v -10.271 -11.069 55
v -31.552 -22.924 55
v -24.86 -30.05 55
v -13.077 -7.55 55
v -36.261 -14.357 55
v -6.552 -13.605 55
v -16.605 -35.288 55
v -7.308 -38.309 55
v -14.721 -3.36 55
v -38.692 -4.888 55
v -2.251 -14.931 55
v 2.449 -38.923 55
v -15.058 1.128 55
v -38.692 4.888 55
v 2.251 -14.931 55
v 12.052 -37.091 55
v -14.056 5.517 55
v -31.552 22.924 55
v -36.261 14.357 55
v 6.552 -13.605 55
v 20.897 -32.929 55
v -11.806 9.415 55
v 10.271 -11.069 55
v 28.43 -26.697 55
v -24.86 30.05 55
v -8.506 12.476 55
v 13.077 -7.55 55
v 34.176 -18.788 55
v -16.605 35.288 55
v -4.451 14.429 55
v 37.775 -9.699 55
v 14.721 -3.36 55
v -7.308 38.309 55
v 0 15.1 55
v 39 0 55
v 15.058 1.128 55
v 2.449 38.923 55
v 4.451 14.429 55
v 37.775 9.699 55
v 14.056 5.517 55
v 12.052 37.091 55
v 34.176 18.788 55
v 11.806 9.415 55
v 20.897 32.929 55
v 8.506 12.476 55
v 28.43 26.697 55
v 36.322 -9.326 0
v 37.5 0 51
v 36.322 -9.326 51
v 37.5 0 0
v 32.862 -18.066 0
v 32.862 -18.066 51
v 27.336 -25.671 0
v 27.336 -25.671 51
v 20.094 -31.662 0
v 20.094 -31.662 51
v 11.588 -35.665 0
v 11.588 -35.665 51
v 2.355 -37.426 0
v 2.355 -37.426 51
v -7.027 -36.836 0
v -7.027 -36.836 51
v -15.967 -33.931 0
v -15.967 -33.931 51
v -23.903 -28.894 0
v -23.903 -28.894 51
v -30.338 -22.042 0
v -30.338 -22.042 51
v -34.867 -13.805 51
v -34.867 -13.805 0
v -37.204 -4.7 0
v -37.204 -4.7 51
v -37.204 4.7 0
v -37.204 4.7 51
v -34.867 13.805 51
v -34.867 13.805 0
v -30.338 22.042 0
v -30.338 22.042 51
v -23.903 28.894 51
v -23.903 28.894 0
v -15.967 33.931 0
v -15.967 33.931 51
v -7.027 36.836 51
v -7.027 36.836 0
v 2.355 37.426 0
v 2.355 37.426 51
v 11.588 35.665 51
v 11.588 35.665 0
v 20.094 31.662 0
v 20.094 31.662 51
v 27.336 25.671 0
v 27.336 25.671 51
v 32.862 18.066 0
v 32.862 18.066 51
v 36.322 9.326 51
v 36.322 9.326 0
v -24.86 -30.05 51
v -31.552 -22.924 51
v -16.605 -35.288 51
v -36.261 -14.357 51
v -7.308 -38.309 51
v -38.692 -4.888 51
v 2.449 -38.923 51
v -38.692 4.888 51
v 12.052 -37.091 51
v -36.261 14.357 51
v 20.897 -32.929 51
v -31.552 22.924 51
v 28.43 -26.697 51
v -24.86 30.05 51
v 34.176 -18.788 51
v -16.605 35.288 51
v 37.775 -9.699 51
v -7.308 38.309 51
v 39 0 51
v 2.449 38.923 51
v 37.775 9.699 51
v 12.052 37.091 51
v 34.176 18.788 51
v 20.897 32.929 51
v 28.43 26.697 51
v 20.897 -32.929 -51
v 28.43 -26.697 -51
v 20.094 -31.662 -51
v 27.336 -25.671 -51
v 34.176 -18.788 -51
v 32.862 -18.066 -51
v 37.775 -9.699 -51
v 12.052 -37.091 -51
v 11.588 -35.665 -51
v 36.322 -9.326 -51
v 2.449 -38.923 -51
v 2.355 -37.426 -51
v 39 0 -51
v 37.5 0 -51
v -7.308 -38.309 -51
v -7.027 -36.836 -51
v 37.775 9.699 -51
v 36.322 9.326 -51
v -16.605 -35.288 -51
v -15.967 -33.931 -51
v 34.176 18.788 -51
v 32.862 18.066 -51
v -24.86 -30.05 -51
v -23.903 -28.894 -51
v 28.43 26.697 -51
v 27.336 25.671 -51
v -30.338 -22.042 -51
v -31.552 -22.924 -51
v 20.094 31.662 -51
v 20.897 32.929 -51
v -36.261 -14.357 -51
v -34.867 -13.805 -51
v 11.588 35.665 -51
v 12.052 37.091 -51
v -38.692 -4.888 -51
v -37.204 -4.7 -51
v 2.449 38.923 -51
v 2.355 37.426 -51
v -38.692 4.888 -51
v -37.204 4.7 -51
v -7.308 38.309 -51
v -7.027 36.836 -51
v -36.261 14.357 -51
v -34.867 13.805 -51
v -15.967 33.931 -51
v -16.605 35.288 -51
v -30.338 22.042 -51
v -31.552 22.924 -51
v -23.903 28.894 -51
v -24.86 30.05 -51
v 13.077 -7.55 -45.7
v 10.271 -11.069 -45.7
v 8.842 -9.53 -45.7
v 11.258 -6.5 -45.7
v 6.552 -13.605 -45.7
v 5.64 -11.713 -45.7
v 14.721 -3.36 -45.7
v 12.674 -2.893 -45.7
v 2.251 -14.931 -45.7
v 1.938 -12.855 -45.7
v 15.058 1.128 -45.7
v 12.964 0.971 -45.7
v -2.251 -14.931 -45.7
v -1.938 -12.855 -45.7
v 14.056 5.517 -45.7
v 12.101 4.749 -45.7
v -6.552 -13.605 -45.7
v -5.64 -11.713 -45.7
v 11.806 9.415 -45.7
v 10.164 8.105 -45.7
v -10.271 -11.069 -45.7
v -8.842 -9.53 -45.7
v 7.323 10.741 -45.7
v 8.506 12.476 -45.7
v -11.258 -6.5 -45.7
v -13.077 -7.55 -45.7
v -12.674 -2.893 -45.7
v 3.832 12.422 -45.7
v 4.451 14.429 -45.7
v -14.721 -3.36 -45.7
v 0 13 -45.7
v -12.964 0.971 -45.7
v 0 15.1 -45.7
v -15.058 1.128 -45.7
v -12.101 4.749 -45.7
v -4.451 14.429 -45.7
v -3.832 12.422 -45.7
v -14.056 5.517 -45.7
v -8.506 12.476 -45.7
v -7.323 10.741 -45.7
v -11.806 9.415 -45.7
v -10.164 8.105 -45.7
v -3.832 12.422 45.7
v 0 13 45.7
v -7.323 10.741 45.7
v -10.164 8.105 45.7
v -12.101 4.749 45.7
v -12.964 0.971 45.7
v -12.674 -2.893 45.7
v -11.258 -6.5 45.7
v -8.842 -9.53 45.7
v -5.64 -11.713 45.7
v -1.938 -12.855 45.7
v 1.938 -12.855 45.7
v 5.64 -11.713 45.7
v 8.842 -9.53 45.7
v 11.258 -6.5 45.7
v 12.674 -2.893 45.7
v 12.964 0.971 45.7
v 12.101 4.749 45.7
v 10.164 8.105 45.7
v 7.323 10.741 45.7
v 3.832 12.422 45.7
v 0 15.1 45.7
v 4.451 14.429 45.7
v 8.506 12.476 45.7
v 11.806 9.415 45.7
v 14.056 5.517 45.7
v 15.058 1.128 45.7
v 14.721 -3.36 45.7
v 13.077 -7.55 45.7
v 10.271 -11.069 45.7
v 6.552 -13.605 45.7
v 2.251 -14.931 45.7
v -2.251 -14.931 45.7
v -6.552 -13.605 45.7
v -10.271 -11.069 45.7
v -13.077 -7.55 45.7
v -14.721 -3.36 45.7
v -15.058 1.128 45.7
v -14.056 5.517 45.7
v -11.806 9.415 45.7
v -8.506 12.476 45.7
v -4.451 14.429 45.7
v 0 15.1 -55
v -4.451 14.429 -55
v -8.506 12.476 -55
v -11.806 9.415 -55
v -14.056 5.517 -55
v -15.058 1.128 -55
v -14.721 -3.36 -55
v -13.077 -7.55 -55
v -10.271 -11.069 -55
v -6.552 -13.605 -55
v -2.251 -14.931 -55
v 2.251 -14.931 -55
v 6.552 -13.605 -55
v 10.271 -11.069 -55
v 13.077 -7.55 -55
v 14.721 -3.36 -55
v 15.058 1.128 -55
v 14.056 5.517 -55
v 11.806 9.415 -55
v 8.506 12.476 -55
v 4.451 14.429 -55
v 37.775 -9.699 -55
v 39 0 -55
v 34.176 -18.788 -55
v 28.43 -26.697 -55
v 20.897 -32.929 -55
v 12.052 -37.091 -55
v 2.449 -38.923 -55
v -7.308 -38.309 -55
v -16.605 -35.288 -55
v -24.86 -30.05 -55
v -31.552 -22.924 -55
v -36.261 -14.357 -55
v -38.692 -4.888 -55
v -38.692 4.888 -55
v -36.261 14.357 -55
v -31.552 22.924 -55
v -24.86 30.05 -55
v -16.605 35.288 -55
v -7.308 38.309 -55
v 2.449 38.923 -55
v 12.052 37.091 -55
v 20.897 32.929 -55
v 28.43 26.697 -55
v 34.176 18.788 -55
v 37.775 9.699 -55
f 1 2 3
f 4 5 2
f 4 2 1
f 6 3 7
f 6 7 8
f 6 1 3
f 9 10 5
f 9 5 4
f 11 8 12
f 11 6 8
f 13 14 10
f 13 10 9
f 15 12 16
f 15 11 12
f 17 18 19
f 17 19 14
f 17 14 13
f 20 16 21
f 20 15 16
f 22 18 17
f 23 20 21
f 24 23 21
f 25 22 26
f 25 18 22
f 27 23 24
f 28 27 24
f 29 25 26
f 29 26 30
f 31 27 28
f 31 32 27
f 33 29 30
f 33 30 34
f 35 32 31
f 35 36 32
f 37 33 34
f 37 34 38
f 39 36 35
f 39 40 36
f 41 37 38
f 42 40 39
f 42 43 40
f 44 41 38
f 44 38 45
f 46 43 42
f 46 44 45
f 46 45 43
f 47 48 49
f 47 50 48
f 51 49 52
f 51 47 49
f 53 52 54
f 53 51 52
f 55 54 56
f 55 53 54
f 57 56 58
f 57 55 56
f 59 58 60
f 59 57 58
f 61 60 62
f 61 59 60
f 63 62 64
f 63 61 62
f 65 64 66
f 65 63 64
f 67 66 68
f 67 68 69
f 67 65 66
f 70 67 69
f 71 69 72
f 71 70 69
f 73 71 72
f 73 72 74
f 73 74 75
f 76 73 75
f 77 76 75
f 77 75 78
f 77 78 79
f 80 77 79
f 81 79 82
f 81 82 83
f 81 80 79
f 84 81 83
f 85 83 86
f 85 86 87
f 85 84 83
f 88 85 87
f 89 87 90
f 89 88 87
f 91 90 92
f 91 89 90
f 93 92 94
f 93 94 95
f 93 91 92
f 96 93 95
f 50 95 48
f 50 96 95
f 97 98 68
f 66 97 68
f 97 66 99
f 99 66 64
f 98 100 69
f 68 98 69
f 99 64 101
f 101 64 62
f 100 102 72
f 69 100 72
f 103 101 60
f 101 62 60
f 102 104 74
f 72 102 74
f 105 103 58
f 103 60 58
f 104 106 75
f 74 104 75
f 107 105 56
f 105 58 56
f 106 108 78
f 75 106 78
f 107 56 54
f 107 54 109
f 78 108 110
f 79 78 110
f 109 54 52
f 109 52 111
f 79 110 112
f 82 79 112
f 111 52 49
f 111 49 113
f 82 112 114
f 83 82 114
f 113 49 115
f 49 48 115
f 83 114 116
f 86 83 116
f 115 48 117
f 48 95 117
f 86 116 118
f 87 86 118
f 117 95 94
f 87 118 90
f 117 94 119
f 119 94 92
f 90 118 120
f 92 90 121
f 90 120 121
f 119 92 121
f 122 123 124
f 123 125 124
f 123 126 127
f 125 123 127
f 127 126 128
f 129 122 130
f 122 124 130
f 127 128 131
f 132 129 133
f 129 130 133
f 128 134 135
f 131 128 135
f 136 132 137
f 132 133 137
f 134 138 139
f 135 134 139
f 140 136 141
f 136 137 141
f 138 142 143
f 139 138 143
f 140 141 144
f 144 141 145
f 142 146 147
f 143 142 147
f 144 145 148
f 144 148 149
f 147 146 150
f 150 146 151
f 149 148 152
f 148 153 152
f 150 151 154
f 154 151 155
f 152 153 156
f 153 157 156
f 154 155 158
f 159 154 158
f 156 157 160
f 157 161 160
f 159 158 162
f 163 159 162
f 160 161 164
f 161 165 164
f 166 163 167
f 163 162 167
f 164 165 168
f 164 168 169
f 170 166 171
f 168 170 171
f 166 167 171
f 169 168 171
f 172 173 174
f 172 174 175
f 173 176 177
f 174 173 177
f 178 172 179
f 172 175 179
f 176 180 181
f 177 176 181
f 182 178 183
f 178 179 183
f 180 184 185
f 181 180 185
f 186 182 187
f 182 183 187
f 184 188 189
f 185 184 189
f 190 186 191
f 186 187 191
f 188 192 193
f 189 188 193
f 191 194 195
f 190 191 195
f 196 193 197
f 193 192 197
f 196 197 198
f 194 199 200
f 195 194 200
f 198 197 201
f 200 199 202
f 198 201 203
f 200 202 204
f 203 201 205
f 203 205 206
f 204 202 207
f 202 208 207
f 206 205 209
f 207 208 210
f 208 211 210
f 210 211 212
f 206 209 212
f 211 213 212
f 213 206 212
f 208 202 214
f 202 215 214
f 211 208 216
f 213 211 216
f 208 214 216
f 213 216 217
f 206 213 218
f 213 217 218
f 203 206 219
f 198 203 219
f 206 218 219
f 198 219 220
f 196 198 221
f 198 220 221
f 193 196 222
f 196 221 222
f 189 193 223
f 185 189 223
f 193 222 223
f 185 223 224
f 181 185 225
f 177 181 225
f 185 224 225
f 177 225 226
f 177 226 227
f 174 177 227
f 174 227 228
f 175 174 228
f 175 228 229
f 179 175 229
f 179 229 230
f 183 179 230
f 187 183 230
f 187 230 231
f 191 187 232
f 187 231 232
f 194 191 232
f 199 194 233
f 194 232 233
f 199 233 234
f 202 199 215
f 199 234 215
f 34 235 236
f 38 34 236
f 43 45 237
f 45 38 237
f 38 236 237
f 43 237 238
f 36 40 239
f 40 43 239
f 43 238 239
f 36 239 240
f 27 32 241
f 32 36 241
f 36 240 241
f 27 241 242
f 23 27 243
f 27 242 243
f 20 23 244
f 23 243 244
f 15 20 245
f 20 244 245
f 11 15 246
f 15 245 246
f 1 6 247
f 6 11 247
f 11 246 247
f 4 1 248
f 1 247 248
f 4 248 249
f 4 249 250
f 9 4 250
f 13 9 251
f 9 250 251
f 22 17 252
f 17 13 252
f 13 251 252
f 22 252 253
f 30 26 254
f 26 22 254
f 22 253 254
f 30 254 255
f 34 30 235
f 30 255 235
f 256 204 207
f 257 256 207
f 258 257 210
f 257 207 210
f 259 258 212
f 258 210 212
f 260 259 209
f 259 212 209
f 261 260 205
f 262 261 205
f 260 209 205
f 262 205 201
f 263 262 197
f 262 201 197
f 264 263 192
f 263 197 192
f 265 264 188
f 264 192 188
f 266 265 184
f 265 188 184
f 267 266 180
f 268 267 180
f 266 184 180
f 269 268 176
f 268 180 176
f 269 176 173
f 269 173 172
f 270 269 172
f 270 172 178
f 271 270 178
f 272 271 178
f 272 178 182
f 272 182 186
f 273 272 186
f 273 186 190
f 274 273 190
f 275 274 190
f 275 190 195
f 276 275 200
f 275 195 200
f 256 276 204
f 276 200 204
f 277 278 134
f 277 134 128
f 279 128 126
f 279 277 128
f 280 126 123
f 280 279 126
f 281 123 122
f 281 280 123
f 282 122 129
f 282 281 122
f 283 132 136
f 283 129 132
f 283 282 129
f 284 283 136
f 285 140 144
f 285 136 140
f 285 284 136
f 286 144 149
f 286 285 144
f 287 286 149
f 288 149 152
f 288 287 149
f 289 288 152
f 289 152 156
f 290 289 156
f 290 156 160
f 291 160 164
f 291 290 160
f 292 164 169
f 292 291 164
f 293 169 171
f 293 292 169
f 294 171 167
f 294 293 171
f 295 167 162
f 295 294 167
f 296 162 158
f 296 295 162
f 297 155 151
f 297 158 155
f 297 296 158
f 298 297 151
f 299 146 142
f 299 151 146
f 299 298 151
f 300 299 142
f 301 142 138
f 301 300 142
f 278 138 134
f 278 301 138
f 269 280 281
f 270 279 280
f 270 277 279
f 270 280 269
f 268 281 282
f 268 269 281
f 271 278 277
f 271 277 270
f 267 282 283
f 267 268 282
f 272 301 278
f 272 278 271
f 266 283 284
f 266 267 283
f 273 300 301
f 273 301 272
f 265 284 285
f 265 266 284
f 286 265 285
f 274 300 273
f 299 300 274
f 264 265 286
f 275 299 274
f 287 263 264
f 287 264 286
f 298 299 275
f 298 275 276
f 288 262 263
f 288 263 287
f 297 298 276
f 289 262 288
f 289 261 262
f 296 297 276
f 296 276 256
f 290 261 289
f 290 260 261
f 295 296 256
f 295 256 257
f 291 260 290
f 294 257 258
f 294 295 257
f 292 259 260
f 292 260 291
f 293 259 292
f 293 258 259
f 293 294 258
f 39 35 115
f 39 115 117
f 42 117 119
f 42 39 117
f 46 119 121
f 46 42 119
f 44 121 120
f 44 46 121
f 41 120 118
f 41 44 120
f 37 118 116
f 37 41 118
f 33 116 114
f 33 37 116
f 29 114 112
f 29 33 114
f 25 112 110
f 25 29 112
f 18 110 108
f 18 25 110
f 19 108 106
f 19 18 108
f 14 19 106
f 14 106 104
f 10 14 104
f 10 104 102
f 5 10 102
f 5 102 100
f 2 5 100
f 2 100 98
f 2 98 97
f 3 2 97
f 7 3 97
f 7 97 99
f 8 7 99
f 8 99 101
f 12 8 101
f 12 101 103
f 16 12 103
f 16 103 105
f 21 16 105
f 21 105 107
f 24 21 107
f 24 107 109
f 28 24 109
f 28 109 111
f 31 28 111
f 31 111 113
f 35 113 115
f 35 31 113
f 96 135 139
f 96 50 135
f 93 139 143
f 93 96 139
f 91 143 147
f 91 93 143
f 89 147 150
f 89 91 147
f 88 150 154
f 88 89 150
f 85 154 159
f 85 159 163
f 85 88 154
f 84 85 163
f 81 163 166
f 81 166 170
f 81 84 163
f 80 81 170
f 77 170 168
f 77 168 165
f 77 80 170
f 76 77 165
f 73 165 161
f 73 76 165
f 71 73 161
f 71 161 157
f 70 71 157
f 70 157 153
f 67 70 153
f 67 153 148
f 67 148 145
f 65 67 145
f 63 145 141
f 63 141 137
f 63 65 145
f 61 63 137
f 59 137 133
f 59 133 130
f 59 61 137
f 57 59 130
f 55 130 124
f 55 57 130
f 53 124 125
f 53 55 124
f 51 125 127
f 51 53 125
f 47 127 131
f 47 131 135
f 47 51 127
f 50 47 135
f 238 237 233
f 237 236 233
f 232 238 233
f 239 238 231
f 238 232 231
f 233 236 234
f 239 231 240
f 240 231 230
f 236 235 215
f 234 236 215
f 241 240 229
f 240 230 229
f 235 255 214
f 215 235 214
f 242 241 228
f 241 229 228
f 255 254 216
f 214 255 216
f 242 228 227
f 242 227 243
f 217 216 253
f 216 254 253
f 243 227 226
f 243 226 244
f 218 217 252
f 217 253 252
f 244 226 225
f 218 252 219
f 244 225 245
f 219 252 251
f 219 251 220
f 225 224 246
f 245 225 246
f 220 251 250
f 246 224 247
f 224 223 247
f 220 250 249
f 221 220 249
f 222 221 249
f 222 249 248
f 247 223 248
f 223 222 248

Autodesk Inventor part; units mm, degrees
ref_plane "YZ Plane" through (0, 0, 0) normal (1, 0, 0) x (0, 1, 0)
ref_plane "XZ Plane" through (0, 0, 0) normal (0, 1, 0) x (-1, 0, 0)
ref_plane "XY Plane" through (0, 0, 0) normal (0, 0, 1) x (1, 0, 0)
sketch "Sketch1" plane through (0, 0, 0) normal (0, 0, 1) x (1, 0, 0)
  circle A0 centre (0, 0) radius 37.5
  dimension "d0" = 75
extrude "Extrusion1" add sketch "Sketch1" along normal mid plane 110
sketch "Sketch5" plane through (0, 0, 55) normal (0, 0, 1) x (1, 0, 0)
  circle A0 centre (0, 0) radius 39
  dimension "d22" = 78
extrude "Extrusion4" add sketch "Sketch5" against normal blind 4
mirror "Mirror2" about plane through (0, 0, 0) normal (0, 0, 1) of "Extrusion4"
sketch "Sketch4" plane through (0, 0, -55) normal (0, 0, -1) x (-1, 0, 0)
  point P0 (0, 0)
  point P1 (0, 0)
hole "Hole1" at (0, 0, -55) direction (0, 0, 1) diameter 26 end through all counterbore diameter 30.2 counterbore depth 9.3
mirror "Mirror1" about plane through (0, 0, 0) normal (0, 0, 1) of "Hole1"
properties part number "13042026-01"
